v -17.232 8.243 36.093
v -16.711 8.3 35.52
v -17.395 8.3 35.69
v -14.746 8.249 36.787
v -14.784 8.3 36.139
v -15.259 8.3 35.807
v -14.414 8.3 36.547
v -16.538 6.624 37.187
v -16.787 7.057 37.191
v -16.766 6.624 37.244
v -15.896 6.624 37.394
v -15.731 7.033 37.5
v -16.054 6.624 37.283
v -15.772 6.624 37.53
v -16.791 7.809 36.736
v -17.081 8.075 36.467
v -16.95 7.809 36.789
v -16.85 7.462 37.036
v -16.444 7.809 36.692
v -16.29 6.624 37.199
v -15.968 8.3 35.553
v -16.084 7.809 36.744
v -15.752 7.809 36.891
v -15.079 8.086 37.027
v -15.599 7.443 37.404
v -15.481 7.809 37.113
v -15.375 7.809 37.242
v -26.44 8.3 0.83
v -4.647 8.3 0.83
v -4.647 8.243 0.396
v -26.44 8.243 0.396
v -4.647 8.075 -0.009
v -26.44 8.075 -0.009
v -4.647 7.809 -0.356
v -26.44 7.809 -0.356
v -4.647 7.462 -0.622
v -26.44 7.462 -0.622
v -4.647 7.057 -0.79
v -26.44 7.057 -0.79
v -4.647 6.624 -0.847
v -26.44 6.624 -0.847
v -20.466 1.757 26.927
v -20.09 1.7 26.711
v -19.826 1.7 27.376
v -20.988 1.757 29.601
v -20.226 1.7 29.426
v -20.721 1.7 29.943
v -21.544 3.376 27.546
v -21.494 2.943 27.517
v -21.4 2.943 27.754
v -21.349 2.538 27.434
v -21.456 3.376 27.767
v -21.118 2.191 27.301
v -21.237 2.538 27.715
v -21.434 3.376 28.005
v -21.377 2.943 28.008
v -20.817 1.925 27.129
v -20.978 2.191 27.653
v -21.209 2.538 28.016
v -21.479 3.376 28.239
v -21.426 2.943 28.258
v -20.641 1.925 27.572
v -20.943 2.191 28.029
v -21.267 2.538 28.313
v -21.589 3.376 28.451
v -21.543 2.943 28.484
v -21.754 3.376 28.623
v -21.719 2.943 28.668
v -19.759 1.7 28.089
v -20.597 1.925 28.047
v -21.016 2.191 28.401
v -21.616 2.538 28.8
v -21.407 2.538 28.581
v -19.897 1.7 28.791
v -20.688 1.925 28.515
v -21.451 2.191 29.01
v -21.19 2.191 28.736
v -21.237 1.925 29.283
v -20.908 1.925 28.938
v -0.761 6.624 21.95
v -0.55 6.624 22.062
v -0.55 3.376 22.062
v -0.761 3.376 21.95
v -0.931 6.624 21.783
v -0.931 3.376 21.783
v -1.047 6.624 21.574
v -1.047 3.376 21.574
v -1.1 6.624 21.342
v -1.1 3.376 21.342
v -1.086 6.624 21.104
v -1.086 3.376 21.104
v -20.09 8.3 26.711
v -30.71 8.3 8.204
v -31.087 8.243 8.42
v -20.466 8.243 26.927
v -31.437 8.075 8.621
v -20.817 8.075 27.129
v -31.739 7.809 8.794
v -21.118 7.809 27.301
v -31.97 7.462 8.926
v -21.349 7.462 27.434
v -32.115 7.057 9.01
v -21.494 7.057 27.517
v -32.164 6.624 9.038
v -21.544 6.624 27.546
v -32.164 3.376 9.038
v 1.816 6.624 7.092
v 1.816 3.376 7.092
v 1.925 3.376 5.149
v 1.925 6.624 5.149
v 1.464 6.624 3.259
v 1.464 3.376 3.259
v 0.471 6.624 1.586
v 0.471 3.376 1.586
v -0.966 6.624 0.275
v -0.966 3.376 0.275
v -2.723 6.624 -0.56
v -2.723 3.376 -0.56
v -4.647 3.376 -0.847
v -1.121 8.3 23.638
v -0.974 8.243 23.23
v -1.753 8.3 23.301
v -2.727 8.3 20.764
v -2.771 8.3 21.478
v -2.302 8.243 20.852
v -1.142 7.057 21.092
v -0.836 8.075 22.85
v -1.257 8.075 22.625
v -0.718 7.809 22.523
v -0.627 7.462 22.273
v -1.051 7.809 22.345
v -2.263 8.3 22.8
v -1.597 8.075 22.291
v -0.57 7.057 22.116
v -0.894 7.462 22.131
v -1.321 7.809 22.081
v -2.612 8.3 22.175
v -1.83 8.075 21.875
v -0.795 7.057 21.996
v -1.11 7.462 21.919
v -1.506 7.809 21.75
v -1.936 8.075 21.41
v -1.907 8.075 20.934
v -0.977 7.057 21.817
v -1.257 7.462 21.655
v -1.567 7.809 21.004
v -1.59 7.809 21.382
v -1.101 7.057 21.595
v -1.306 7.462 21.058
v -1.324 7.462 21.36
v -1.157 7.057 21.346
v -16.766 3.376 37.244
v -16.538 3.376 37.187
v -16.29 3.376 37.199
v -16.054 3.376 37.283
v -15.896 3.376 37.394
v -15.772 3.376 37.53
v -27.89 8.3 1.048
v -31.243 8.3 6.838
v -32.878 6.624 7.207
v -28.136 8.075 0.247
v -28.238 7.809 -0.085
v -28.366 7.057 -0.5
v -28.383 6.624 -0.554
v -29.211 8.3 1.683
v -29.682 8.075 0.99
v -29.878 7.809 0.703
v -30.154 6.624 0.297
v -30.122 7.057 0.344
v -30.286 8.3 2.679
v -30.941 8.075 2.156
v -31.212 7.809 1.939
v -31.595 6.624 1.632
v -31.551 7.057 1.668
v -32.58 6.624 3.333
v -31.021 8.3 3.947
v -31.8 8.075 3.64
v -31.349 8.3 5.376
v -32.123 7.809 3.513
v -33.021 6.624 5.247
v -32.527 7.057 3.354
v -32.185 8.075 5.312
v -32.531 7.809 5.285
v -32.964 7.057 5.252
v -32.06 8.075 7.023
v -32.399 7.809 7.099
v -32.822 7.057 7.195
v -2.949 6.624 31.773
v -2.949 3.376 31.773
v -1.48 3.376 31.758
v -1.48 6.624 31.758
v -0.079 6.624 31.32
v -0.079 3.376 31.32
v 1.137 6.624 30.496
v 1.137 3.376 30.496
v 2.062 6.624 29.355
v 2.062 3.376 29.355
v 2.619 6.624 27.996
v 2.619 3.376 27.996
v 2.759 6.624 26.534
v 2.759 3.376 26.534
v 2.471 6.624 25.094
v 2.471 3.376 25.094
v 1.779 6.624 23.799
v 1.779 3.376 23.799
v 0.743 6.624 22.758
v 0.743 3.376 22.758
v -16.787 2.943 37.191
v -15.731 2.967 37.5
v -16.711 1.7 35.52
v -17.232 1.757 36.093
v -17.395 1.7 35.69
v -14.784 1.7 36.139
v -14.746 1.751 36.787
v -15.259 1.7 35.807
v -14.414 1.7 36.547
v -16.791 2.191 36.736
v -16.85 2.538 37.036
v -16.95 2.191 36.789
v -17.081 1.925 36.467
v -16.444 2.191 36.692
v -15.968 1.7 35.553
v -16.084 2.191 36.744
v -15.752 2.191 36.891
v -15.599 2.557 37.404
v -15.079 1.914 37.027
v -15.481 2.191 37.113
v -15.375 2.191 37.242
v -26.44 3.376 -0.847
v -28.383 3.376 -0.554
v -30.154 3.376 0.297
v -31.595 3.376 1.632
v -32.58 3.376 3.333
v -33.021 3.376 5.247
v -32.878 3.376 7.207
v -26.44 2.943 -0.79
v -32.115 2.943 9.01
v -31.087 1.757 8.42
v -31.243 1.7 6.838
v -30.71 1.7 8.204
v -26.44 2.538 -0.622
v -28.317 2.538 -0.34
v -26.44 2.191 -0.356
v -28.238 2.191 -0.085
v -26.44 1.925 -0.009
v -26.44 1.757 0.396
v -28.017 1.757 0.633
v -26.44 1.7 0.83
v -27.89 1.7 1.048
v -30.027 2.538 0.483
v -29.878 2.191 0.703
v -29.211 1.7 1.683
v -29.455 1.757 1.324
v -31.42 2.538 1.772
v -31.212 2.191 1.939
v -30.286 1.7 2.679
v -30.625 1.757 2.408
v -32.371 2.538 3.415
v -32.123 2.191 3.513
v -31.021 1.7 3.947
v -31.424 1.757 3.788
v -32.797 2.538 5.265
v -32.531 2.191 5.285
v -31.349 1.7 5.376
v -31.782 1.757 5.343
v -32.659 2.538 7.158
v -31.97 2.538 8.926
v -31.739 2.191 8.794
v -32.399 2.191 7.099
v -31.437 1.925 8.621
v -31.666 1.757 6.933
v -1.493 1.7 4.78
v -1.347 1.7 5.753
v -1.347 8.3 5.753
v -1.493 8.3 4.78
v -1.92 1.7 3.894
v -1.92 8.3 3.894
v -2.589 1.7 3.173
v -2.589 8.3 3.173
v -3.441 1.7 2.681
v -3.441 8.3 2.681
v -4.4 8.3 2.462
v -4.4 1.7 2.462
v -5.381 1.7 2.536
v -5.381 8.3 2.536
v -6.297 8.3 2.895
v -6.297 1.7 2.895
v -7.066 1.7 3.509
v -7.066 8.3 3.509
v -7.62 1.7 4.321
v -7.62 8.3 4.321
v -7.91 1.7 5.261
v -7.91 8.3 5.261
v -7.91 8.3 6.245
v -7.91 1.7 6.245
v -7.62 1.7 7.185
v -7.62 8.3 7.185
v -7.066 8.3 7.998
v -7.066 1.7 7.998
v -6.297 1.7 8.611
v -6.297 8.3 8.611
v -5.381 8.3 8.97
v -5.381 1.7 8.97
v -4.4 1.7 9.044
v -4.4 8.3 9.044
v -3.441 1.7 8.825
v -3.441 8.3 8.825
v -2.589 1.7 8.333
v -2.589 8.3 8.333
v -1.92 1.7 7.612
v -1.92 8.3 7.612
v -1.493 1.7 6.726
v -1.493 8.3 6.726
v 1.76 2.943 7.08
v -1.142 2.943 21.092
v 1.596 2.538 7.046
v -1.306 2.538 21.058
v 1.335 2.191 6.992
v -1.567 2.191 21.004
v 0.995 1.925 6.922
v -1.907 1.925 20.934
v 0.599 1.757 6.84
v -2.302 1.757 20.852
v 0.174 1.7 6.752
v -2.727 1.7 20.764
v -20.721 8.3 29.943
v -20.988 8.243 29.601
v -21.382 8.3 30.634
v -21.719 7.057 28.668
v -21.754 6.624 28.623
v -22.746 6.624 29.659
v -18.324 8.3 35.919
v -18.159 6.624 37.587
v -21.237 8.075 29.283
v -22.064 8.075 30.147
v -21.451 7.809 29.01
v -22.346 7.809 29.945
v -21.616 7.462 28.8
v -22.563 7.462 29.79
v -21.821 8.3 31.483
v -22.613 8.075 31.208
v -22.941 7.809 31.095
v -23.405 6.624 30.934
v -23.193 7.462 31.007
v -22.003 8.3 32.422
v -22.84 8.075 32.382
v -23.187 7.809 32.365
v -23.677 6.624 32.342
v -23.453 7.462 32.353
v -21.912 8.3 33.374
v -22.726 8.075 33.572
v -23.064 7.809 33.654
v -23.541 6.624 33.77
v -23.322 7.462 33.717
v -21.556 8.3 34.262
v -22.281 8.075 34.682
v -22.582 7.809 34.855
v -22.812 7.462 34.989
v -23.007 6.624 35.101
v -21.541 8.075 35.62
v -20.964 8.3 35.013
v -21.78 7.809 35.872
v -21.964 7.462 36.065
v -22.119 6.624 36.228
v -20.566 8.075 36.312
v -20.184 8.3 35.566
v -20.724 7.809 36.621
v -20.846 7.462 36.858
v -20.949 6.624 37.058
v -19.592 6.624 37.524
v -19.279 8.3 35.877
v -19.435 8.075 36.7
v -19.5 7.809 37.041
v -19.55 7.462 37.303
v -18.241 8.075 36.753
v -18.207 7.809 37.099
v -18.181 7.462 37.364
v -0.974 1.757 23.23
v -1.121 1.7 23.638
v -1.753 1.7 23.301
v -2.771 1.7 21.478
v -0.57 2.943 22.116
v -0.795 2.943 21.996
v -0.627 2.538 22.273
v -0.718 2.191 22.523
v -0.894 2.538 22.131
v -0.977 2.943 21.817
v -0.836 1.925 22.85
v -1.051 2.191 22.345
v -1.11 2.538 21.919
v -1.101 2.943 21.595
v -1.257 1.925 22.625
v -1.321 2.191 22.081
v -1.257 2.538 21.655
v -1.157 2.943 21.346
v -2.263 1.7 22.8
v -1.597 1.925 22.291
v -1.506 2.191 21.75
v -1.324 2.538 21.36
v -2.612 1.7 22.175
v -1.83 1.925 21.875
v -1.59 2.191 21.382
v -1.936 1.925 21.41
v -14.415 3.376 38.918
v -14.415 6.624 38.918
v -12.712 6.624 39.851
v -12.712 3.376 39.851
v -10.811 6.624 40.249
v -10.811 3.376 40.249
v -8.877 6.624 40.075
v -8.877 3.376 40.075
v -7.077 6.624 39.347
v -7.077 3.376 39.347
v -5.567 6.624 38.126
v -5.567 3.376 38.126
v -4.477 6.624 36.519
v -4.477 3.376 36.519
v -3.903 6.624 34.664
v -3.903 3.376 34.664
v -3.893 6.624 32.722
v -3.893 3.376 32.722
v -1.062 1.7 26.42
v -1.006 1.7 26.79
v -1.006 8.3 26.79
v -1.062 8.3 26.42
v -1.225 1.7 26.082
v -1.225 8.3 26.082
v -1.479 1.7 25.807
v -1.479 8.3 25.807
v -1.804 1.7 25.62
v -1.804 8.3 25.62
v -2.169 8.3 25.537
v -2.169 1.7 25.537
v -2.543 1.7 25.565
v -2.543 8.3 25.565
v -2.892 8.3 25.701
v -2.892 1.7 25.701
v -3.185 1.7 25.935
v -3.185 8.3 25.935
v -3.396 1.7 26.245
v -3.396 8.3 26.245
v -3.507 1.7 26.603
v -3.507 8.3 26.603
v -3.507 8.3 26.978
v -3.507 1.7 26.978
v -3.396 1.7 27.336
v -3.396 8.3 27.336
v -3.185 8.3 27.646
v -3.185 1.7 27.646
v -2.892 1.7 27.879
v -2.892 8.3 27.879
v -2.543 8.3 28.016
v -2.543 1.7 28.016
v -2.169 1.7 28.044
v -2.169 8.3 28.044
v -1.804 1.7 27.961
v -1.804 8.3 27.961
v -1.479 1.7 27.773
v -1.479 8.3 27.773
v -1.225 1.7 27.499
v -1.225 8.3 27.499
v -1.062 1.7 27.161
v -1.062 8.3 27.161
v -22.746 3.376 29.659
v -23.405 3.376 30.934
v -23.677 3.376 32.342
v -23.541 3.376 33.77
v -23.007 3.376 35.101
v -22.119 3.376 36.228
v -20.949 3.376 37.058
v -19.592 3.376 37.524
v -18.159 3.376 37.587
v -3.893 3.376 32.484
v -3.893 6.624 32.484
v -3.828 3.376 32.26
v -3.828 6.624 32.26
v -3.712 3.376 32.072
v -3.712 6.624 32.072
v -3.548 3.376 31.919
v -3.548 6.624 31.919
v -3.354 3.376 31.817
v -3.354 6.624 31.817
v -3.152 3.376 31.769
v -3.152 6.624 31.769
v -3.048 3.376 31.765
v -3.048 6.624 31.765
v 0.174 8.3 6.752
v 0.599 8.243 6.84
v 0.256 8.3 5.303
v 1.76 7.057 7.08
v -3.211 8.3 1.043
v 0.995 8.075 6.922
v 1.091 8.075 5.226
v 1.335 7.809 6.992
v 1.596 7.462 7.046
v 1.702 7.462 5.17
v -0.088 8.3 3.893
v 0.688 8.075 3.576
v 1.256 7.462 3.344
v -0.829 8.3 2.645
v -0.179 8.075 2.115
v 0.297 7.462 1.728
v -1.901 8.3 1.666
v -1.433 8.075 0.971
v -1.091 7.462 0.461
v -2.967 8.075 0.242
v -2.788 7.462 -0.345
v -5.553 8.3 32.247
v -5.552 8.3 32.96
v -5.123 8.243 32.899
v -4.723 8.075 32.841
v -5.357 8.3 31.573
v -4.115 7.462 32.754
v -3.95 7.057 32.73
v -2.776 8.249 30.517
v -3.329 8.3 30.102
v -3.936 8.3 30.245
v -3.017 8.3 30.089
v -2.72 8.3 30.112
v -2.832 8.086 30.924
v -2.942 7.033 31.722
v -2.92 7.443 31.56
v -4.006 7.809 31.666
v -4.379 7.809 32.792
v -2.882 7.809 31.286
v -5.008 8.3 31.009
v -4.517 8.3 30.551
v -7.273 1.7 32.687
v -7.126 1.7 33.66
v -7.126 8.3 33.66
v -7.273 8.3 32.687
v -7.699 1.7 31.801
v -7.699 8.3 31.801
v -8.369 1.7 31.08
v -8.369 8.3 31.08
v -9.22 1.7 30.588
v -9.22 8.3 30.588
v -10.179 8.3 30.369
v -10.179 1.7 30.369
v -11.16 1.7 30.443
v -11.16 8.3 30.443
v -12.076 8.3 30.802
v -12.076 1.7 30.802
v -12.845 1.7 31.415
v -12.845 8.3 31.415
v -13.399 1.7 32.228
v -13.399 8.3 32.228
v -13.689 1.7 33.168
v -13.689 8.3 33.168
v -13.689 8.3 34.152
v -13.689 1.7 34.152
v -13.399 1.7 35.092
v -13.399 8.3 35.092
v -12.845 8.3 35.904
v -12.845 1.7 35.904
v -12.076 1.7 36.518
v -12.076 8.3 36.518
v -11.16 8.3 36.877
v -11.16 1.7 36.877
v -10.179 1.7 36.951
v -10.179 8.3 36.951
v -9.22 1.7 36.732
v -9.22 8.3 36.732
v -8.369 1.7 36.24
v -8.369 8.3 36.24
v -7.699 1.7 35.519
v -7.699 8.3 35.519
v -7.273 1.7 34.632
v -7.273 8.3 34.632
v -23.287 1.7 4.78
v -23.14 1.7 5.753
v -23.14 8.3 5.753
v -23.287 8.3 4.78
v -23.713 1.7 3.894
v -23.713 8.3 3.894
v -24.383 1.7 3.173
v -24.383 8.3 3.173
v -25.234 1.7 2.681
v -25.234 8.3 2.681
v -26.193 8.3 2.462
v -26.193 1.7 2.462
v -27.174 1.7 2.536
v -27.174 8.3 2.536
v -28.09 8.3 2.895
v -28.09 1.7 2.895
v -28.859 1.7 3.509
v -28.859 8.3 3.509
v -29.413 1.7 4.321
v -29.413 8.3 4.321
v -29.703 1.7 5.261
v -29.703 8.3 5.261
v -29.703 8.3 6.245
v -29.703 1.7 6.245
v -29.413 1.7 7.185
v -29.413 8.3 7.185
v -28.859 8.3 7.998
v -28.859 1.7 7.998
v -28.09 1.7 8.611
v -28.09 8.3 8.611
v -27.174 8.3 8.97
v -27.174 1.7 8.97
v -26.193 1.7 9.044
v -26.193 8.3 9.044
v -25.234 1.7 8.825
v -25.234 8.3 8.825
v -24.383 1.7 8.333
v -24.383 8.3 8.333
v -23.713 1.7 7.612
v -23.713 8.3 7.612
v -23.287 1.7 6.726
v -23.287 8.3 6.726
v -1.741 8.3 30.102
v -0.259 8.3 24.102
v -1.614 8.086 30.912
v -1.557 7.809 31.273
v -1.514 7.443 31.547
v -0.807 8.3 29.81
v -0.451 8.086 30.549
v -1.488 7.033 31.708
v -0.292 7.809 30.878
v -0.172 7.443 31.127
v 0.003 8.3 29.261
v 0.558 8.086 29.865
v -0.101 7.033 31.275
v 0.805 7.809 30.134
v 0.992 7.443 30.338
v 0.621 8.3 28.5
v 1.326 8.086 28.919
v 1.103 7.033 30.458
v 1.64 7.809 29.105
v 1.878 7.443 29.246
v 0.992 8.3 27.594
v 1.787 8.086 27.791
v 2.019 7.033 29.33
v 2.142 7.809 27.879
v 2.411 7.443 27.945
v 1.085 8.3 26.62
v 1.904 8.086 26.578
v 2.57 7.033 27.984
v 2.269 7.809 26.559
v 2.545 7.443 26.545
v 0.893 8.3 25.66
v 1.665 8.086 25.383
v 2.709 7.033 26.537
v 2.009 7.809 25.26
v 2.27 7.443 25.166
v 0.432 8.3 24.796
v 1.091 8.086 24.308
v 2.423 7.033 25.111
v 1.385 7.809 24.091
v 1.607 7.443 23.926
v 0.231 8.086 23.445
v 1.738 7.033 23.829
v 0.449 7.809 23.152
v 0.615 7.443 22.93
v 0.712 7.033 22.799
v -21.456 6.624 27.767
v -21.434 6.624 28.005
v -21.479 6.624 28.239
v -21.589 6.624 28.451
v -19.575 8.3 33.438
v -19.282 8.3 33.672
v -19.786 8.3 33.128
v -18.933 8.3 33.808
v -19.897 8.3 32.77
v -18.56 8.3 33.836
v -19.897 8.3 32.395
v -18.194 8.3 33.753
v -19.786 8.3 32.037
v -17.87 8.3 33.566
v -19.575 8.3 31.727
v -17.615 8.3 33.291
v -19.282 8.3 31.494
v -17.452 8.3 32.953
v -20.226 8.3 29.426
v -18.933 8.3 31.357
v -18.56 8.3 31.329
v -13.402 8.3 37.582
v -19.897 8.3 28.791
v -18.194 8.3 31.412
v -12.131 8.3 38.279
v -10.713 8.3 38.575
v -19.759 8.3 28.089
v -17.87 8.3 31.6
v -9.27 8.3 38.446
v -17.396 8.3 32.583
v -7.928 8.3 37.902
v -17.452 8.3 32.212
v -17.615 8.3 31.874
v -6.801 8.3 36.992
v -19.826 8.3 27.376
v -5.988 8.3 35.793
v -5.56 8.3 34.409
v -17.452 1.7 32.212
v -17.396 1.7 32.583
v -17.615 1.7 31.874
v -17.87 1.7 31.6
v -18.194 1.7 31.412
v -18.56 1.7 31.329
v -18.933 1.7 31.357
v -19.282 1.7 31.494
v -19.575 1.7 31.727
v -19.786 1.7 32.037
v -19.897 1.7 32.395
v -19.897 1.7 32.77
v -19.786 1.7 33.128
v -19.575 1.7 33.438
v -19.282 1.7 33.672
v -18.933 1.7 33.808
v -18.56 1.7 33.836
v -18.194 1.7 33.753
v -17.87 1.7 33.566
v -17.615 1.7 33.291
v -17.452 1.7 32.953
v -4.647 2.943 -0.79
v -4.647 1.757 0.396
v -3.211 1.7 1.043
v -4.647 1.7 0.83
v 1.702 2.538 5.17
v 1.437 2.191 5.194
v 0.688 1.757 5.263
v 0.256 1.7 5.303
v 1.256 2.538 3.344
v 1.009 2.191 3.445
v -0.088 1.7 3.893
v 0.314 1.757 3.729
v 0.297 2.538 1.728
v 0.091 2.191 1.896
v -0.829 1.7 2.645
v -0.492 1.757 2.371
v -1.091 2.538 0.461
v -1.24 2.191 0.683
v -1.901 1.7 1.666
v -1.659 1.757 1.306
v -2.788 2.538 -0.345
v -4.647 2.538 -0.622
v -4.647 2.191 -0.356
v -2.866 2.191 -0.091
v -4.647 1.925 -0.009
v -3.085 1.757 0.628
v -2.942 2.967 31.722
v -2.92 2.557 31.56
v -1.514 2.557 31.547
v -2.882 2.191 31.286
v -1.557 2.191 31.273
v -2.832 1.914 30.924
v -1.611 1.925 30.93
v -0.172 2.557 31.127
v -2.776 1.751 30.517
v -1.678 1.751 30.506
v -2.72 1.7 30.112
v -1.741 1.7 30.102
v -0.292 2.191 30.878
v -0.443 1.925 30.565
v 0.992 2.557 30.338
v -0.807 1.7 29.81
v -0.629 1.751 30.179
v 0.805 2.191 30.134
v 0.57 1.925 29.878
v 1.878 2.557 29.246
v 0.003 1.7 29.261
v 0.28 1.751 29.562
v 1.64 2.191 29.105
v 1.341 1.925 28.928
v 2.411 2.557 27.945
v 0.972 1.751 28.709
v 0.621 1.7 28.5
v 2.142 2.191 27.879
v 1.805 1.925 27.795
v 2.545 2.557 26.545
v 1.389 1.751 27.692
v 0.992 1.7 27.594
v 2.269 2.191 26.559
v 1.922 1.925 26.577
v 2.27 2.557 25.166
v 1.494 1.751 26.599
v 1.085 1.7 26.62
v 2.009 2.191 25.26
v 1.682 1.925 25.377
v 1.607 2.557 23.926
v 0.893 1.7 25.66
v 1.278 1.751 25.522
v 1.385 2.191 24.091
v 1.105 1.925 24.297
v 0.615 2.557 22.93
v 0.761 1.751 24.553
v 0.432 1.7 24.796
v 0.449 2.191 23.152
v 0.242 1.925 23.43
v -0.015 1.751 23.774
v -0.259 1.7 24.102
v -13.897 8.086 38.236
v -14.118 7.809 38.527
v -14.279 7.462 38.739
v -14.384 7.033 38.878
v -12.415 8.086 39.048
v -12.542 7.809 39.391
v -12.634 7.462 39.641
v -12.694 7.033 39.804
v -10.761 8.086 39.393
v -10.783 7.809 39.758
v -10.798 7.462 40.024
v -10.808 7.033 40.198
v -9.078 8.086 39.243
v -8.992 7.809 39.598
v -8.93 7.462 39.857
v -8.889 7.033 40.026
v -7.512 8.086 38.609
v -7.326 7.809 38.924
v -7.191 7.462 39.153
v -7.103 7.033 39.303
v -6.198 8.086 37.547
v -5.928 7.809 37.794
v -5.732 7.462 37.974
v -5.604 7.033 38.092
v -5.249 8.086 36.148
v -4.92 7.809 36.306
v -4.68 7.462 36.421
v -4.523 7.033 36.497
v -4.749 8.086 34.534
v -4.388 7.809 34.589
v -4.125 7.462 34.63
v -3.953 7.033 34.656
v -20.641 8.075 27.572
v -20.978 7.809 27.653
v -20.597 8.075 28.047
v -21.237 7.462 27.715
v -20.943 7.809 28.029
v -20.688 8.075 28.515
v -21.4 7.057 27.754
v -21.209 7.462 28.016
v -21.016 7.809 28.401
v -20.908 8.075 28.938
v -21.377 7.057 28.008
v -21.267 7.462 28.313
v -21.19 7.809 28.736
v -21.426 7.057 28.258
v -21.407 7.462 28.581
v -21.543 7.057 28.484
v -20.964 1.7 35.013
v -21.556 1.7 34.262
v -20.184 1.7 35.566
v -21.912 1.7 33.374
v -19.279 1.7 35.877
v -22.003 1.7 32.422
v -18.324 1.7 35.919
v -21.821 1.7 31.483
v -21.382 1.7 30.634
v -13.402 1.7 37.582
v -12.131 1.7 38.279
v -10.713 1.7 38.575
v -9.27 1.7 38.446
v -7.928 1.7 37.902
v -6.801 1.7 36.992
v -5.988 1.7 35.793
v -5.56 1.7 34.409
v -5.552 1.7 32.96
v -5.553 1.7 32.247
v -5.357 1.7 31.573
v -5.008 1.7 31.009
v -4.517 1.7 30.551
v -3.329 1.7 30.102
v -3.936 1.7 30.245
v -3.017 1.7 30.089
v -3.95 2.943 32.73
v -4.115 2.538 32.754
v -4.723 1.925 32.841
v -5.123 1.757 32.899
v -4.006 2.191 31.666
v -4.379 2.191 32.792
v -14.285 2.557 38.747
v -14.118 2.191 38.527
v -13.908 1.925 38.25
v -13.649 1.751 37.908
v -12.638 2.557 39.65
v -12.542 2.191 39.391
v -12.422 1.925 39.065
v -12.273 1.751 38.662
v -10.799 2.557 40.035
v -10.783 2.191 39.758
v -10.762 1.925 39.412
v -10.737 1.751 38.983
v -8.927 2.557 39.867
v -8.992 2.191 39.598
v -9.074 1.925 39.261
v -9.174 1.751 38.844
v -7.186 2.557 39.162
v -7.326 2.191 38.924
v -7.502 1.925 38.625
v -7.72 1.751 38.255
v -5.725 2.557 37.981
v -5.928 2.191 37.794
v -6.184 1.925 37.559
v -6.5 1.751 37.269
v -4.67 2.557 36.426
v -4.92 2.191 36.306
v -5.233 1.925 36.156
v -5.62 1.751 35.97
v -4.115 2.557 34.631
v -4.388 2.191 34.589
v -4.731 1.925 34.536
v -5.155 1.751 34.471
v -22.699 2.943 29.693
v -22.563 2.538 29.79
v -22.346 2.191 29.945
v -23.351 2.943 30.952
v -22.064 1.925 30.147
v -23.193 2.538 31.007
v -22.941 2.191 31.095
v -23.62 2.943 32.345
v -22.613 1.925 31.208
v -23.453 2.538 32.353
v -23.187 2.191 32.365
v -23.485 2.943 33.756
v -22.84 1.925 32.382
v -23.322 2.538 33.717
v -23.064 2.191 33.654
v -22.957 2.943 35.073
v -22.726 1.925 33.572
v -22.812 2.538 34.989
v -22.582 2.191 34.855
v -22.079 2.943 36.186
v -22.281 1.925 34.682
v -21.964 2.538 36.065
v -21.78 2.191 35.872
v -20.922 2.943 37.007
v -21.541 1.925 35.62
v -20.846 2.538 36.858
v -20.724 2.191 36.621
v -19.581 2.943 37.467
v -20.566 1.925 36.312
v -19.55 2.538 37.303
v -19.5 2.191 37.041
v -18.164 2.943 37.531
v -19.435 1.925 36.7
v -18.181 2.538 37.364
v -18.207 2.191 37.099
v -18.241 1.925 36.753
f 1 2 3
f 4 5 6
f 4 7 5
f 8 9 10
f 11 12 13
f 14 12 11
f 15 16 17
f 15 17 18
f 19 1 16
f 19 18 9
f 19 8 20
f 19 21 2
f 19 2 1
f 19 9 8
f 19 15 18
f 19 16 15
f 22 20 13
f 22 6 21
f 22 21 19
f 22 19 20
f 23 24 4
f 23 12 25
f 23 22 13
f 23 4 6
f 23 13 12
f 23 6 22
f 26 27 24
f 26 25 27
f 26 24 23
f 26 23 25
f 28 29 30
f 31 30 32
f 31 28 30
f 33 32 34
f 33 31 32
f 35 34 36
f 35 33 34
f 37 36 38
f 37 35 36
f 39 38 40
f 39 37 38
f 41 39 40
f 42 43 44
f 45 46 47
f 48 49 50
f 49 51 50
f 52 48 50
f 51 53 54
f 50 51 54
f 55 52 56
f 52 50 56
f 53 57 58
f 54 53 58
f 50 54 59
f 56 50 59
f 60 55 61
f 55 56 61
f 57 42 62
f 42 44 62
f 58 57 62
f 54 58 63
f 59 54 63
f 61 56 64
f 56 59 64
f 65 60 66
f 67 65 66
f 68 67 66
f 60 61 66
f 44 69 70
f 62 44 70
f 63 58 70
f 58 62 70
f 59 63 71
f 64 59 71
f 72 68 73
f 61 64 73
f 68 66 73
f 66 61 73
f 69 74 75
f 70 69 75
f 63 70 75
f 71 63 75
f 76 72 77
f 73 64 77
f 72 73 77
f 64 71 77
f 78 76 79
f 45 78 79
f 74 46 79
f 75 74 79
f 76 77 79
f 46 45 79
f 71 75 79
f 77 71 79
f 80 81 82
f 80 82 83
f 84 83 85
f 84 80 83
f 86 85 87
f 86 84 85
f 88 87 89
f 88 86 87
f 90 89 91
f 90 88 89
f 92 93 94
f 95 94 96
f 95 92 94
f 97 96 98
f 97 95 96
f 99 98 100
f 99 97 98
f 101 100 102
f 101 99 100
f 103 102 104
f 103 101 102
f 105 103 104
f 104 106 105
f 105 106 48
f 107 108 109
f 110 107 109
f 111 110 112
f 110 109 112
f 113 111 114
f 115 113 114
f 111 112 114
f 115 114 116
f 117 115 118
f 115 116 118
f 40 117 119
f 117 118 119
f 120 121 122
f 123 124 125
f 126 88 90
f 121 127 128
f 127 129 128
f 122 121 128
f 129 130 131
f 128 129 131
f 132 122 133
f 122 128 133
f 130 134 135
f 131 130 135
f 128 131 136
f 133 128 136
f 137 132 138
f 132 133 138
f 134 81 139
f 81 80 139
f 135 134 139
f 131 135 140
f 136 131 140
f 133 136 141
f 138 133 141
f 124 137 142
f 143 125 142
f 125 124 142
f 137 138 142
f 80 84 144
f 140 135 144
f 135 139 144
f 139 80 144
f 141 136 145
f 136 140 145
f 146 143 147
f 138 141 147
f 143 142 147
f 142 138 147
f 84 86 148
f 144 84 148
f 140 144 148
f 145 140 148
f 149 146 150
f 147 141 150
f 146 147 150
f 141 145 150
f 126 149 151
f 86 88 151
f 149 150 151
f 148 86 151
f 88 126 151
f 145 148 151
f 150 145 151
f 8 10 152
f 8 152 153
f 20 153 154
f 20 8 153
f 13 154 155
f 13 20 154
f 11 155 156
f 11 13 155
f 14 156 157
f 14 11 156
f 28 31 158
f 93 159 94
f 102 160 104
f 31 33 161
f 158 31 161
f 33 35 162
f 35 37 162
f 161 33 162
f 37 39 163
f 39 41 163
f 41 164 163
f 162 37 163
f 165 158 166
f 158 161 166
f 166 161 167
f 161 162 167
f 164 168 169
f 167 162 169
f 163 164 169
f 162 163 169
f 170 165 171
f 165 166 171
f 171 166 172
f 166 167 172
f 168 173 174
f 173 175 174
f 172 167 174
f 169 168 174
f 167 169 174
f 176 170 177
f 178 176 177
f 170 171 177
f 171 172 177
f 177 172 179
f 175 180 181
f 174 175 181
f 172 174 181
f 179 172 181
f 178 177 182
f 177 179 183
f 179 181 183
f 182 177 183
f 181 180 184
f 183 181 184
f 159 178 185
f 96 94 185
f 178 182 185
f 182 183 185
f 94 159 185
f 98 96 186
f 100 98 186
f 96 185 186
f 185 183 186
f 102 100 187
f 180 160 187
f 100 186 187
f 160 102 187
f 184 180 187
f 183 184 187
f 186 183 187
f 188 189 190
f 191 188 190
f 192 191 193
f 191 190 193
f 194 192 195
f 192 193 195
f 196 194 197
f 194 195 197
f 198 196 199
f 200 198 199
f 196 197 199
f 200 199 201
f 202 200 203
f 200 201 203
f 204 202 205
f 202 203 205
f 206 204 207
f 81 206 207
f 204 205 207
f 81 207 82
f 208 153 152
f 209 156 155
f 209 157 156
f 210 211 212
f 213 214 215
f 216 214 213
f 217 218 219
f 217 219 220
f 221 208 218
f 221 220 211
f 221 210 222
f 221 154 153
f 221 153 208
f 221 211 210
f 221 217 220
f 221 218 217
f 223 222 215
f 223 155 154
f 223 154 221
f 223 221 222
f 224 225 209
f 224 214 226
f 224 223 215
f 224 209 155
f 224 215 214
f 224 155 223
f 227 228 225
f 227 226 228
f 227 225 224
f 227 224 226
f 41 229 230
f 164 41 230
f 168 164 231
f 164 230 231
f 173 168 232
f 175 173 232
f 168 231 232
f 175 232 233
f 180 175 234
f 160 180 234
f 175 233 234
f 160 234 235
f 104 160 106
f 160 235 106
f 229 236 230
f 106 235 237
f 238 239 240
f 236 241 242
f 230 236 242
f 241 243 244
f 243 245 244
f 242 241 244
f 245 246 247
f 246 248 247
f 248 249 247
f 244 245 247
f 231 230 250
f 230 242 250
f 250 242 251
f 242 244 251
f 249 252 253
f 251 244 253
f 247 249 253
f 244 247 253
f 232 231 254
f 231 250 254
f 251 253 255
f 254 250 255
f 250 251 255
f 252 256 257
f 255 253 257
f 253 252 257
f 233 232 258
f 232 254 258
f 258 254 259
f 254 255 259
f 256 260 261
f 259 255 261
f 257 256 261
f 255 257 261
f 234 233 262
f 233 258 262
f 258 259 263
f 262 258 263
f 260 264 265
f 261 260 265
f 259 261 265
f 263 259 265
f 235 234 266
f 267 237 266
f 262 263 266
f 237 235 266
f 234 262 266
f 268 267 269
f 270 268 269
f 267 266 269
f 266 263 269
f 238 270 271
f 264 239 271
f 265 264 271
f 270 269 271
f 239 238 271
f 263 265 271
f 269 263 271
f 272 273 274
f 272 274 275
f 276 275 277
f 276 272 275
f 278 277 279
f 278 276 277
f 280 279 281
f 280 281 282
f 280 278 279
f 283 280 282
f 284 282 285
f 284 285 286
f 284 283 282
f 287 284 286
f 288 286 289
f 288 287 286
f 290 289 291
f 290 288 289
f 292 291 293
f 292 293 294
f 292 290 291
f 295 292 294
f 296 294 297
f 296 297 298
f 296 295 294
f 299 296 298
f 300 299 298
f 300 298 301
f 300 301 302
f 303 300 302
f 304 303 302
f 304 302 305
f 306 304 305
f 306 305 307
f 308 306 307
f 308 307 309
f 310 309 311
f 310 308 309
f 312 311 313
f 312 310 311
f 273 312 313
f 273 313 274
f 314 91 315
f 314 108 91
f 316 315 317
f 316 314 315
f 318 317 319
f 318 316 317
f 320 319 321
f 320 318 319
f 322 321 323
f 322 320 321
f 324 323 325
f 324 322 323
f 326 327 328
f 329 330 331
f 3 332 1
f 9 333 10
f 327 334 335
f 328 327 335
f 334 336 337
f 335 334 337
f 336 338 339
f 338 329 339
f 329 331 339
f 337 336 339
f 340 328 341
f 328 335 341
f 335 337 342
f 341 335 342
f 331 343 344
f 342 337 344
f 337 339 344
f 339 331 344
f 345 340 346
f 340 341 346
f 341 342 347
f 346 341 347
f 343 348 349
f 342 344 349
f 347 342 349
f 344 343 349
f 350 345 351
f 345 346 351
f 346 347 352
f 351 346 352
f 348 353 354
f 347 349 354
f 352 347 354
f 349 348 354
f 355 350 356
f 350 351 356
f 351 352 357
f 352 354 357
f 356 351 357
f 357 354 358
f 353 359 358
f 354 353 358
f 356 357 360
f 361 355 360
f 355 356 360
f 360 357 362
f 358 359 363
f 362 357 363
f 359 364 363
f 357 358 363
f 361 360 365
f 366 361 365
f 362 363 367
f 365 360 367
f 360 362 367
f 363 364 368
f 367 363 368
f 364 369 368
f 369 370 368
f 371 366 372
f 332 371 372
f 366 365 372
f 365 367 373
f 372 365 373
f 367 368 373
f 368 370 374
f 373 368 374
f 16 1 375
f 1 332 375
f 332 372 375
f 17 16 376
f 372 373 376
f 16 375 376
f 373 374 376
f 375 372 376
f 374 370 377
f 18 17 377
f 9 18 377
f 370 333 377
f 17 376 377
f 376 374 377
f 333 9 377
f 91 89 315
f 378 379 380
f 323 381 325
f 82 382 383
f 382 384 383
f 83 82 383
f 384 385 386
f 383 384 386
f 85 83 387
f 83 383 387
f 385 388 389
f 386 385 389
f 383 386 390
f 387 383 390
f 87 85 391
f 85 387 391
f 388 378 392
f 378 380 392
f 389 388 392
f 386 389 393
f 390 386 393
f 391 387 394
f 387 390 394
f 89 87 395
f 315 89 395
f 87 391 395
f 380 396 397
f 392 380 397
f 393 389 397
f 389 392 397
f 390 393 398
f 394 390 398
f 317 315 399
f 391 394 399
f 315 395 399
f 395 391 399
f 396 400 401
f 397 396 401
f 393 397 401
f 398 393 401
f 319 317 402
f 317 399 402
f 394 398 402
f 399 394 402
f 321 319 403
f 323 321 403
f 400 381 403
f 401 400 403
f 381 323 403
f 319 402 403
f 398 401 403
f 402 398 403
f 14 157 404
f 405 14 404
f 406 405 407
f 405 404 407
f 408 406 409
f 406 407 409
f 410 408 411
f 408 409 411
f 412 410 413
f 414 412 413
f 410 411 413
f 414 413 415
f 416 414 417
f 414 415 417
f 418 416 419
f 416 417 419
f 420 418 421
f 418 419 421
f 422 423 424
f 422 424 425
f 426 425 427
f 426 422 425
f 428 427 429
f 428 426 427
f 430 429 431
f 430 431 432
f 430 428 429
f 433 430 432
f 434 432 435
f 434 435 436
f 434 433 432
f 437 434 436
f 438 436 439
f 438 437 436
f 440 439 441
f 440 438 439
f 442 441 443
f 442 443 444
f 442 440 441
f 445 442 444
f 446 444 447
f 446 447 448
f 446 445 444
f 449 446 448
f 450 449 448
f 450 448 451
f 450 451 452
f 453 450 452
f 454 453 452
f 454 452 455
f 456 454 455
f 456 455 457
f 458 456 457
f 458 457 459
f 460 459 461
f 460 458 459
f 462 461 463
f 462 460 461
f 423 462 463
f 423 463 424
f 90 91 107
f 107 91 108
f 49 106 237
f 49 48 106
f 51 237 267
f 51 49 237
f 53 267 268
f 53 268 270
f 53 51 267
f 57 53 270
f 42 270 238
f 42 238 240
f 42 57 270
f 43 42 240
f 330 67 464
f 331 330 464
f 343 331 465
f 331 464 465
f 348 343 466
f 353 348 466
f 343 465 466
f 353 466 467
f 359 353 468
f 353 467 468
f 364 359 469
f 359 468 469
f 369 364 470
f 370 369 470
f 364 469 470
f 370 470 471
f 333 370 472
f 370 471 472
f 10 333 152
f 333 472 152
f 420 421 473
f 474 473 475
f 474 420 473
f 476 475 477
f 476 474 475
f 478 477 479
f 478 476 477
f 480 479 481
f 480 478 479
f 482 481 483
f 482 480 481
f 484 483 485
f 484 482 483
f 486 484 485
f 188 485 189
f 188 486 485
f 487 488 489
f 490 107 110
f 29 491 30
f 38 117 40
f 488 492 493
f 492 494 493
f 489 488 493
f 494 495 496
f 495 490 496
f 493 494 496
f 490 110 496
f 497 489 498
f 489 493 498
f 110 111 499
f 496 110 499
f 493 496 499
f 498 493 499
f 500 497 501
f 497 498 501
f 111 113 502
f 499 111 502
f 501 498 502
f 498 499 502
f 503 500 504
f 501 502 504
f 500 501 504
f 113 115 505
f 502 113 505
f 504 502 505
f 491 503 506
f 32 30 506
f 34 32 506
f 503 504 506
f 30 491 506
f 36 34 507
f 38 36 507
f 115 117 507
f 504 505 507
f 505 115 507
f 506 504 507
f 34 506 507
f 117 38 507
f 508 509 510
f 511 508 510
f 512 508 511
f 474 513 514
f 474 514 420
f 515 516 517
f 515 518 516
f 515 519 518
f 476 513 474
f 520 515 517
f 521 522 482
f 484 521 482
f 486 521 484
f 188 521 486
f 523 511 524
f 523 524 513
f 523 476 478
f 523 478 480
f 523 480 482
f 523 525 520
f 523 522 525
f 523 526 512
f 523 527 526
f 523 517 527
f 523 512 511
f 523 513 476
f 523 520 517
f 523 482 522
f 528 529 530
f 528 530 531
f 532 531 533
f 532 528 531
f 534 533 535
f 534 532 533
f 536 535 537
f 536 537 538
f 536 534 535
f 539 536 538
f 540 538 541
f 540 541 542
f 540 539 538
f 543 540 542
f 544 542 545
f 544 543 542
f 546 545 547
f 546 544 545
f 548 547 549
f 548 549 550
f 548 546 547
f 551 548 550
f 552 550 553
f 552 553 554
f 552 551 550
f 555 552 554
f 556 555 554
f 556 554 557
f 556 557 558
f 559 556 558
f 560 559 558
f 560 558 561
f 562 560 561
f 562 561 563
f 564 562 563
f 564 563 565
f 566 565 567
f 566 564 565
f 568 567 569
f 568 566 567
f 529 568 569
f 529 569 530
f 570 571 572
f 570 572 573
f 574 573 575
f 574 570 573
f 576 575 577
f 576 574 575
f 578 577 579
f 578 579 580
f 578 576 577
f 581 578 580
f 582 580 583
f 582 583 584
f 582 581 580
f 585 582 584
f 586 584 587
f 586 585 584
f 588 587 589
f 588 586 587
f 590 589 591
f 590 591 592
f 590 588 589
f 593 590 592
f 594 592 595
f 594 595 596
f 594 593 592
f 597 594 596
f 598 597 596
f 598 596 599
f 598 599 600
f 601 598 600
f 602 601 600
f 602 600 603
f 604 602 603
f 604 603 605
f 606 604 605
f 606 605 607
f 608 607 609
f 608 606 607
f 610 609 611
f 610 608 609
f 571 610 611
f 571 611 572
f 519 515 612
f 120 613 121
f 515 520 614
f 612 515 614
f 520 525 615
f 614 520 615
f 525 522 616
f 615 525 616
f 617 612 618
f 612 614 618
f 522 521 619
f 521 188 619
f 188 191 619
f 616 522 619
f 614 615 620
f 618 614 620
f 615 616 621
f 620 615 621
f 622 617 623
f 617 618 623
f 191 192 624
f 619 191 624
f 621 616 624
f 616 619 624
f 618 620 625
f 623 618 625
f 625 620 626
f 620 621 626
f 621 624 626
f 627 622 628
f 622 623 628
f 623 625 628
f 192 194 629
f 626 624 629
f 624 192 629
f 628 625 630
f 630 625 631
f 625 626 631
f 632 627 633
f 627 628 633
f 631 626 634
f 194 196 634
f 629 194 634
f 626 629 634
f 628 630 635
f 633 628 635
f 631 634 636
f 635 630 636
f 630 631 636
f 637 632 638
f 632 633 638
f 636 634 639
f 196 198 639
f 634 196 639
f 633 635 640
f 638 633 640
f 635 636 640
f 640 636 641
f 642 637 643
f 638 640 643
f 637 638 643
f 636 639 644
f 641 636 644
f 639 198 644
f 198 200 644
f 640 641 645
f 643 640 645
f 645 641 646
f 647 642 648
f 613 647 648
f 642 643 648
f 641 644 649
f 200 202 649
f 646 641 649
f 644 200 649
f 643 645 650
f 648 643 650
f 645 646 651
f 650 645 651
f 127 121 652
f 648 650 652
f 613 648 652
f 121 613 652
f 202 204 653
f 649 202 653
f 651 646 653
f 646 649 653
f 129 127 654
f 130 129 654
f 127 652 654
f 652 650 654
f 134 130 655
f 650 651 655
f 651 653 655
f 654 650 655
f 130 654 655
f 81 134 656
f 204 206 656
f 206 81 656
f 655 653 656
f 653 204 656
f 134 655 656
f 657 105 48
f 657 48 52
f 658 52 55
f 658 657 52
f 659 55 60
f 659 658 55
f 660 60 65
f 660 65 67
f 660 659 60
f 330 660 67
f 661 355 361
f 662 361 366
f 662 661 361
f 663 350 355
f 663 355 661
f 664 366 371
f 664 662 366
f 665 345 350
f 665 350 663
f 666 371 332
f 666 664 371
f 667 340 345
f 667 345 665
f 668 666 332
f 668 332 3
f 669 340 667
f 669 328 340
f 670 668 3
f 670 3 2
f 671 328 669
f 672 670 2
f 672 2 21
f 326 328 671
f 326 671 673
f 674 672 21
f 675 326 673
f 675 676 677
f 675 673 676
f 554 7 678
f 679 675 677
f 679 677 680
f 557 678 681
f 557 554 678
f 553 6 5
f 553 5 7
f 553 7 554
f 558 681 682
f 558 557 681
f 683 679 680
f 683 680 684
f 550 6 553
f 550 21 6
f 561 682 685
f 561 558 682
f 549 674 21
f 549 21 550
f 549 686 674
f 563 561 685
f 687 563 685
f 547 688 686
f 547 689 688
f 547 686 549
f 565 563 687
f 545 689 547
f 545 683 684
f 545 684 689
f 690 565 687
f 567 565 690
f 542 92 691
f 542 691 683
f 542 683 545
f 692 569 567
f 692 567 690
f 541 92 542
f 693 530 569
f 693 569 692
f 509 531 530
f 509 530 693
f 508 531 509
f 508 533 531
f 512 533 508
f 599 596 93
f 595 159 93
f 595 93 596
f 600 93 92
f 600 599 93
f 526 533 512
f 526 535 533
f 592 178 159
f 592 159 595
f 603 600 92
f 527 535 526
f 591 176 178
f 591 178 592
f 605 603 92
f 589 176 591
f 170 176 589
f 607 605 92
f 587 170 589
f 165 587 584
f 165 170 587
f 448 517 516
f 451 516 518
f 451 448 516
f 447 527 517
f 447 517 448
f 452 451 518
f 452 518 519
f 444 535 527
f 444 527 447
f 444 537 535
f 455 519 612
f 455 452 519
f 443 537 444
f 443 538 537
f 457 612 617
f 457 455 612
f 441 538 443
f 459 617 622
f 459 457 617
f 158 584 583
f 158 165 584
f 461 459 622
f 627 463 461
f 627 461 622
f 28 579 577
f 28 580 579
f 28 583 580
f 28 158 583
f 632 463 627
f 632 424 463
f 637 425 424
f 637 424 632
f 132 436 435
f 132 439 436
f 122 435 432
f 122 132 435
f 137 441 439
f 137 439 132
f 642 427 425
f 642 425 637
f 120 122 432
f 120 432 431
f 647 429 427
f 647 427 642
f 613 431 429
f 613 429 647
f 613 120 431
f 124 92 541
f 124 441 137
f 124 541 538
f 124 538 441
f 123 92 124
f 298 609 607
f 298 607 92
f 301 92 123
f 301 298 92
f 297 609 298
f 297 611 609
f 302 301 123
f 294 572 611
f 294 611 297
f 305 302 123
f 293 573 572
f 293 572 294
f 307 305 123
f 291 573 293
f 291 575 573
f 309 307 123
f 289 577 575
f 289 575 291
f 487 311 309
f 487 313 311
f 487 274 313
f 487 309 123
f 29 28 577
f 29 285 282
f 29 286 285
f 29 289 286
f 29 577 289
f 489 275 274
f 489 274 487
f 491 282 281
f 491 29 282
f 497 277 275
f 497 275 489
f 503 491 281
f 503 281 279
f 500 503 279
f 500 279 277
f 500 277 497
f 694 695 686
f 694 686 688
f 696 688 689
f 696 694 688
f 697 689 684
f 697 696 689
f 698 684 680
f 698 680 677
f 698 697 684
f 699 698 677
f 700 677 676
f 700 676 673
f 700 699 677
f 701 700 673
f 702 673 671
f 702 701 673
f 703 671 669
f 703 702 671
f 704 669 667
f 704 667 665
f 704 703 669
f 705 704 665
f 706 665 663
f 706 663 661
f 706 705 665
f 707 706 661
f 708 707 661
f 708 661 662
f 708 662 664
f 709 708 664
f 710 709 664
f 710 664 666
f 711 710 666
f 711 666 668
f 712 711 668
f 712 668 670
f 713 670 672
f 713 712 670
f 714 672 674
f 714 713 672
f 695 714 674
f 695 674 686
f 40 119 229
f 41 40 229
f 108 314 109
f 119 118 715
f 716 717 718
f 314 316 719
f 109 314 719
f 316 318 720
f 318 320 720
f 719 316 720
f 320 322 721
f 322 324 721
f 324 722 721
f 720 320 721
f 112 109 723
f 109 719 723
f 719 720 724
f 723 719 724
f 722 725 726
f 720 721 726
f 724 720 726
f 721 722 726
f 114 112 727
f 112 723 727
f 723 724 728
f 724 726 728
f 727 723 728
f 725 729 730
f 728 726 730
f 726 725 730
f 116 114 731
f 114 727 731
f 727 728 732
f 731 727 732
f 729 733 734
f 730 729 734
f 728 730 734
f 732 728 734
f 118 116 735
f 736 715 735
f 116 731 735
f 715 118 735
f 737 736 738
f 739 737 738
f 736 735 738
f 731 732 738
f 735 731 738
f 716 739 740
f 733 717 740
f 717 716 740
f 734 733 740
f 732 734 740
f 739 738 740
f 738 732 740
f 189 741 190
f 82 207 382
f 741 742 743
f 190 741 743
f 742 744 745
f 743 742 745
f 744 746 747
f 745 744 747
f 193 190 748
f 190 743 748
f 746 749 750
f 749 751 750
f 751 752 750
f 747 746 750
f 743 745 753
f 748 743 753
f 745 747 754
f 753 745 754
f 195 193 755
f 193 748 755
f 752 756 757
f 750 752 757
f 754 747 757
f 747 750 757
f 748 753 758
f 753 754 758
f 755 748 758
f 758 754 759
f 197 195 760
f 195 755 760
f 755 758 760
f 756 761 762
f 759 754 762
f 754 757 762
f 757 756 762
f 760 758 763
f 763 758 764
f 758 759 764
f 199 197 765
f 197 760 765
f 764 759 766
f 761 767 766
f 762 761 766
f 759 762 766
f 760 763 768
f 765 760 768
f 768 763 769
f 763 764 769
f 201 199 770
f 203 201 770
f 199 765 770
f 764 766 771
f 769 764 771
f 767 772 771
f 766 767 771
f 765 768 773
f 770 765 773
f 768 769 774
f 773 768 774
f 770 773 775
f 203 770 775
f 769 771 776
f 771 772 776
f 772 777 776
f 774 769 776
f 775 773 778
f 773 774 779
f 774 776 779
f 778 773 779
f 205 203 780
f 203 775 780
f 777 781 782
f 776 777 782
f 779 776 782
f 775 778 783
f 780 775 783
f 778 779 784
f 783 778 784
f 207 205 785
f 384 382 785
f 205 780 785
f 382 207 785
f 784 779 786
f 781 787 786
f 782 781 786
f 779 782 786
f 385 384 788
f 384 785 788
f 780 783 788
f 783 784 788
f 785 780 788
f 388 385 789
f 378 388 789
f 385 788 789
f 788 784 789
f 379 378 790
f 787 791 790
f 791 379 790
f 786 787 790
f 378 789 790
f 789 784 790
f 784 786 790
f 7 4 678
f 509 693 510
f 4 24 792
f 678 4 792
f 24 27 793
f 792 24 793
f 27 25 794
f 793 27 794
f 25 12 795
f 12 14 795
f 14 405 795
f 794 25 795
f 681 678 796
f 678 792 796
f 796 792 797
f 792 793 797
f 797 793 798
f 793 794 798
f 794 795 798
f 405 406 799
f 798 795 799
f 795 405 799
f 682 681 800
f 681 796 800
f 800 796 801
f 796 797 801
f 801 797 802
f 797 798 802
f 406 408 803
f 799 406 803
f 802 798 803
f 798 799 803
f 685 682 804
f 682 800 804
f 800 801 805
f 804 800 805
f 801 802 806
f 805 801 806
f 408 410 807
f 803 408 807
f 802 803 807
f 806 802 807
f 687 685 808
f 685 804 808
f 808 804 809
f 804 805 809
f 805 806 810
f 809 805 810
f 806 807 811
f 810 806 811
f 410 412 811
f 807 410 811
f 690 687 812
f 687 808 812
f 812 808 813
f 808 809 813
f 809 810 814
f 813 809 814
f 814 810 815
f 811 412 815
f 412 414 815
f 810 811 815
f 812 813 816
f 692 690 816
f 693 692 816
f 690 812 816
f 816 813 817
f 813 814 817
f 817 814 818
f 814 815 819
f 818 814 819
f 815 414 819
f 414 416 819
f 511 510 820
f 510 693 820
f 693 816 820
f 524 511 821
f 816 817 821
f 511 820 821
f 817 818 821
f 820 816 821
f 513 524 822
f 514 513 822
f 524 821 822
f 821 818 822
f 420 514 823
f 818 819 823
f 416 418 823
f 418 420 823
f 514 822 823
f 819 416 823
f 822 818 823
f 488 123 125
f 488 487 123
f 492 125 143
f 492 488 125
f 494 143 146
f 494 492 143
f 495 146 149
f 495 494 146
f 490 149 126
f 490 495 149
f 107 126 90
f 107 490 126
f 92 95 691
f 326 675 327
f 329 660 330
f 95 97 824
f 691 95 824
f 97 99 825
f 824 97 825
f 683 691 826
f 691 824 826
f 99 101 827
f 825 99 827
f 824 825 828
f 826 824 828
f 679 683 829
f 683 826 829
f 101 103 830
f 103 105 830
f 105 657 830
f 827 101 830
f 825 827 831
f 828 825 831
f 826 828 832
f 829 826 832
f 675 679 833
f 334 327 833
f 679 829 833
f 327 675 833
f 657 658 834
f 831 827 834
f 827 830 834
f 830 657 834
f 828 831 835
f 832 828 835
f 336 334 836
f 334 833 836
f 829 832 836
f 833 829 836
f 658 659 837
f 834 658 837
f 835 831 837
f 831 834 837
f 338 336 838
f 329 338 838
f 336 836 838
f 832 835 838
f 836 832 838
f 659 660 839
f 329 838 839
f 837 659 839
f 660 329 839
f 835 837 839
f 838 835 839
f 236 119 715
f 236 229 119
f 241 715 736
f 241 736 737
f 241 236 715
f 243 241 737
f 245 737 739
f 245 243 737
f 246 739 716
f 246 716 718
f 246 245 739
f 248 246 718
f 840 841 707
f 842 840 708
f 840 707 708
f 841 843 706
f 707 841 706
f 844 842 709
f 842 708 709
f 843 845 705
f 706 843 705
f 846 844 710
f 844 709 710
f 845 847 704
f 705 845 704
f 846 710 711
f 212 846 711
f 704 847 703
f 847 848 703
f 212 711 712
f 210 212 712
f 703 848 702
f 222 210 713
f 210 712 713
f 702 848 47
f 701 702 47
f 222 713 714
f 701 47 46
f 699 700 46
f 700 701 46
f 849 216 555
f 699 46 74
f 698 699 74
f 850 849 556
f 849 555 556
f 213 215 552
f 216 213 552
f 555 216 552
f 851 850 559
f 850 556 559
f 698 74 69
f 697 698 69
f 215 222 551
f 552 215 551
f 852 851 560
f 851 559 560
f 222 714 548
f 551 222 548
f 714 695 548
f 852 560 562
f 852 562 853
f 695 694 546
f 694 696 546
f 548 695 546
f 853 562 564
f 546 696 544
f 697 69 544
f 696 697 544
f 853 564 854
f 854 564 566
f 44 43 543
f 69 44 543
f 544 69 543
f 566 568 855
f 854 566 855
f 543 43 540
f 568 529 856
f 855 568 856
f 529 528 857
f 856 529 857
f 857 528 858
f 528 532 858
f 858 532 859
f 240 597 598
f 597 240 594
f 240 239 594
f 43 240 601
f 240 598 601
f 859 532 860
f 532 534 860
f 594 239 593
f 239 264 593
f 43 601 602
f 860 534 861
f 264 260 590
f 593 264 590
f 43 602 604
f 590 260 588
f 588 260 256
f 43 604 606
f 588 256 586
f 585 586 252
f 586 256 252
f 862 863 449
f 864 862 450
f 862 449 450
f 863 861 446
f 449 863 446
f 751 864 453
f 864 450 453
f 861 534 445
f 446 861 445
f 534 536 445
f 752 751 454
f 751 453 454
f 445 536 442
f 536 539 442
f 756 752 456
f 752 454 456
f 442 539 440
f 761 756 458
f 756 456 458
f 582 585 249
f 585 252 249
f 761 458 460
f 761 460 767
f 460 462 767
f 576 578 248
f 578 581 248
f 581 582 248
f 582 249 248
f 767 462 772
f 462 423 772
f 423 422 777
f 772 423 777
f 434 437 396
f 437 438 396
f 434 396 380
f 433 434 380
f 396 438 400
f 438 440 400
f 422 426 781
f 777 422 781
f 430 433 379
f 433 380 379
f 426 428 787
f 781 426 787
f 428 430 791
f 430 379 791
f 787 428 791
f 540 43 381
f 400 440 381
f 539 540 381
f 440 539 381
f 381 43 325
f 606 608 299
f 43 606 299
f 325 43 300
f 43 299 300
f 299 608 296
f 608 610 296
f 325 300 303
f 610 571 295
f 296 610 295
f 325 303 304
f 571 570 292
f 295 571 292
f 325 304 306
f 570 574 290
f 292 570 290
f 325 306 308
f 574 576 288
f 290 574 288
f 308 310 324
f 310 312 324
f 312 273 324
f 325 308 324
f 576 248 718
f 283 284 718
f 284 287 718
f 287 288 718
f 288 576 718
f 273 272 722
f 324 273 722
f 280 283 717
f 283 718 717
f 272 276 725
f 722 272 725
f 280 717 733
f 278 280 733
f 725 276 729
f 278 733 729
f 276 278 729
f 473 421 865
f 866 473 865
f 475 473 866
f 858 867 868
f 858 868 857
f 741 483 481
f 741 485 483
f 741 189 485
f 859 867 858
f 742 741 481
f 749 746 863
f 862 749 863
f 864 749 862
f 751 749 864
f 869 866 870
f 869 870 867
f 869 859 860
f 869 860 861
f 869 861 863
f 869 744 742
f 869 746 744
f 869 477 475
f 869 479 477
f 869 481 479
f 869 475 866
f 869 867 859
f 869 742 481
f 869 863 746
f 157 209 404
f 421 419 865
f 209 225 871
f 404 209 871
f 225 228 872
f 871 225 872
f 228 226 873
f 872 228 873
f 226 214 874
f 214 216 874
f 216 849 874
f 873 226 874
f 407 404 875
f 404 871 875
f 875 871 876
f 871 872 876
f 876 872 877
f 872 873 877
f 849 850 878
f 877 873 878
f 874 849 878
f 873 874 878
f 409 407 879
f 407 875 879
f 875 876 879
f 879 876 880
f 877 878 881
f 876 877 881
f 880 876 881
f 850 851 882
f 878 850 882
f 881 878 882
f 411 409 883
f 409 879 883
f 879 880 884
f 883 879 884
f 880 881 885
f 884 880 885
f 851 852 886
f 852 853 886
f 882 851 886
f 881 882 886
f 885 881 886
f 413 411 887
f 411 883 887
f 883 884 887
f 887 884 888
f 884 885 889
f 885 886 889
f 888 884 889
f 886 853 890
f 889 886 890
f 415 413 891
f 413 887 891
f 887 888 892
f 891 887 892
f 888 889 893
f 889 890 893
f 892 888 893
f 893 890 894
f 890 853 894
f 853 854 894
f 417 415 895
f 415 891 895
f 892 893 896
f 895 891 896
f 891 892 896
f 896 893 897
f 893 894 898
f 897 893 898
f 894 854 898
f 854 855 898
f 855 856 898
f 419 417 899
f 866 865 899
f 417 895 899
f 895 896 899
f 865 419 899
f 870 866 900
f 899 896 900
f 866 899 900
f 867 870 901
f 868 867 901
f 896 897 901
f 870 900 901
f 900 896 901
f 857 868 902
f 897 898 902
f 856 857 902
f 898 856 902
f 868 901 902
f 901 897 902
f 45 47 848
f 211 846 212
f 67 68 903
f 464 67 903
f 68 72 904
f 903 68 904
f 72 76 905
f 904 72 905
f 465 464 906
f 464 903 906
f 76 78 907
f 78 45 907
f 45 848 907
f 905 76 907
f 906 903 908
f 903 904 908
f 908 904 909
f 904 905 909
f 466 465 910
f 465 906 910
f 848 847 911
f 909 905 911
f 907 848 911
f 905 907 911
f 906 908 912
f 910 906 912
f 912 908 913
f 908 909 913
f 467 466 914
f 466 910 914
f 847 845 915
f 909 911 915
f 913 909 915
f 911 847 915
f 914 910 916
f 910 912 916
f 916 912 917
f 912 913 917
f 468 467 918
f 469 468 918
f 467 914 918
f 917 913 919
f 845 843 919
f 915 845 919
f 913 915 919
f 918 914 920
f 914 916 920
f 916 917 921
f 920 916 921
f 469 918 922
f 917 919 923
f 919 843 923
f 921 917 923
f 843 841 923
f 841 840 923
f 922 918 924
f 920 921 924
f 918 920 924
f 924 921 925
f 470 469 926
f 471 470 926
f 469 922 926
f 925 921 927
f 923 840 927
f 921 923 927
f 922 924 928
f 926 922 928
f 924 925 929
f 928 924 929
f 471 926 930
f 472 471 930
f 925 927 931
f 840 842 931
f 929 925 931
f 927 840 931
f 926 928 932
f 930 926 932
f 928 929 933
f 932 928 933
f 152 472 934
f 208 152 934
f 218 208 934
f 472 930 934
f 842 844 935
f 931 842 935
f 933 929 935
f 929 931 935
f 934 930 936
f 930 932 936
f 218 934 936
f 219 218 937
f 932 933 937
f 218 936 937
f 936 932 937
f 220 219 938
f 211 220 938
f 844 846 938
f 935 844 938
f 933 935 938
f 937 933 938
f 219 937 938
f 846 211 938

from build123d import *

# Parameters (mm, degrees)
SKETCH1_R           = 5
SKETCH1_R_2         = 1.905
BOSS_EXTRUDE1_DEPTH = 10
FILLET2_R           = 1.27
FILLET1_R           = 2.54
SCALE1_SCALE        = 0.66


with BuildPart() as part:
    # Sketch1 → Boss-Extrude1 (new body)
    with BuildSketch(Plane(origin=(0, 0, 0), x_dir=(1, 0, 0), z_dir=(0, 1, 0))):
        with BuildLine():
            Line((-41.693402896, -4.977156036), (-25.014953019, -34.04172914))
            ThreePointArc((-25.014953019, -34.04172914), (-27.831493127, -44.443455046), (-17.42976722, -47.259995153))
            ThreePointArc((-17.42976722, -47.259995153), (-4.558655696, -51.359140251), (0.652959758, -38.896894596))
            ThreePointArc((0.652959758, -38.896894596), (10.887641345, -34.13704865), (5.156505389, -24.412907491))
            Line((5.156505389, -24.412907491), (9.792227679, -2.027875017))
            ThreePointArc((9.792227679, -2.027875017), (7.754958097, 6.313527137), (0, 10))
            Line((0, 10), (-33.02, 10))
            ThreePointArc((-33.02, 10), (-41.673657041, 5.011408966), (-41.693402896, -4.977156036))
        make_face()
        with Locations((-33.02, 0)):
            Circle(SKETCH1_R, mode=Mode.SUBTRACT)
        Circle(SKETCH1_R, mode=Mode.SUBTRACT)
        with Locations((-8.756364325, -42.282839117)):
            Circle(SKETCH1_R, mode=Mode.SUBTRACT)
        with Locations((-21.22236012, -40.650862147)):
            Circle(SKETCH1_R_2, mode=Mode.SUBTRACT)
        with Locations((3.611264626, -31.874584982)):
            Circle(SKETCH1_R_2, mode=Mode.SUBTRACT)
    extrude(amount=BOSS_EXTRUDE1_DEPTH)

    # Fillet2
    fillet2_edges = [part.edges().sort_by_distance(p)[0] for p in [
        (5.156505389, 5, 24.412907491),
        (0.652959758, 5, 38.896894596),
        (-17.42976722, 5, 47.259995153),
        (-25.014953019, 5, 34.04172914),
    ]]
    fillet(fillet2_edges, radius=FILLET2_R)

    # Fillet1
    fillet1_edges = [part.edges().sort_by_distance(p)[0] for p in [
        (-33.647536039, 0, 18.998224371),
        (-41.673657041, 0, -5.011408966),
        (7.754958097, 10, -6.313527137),
        (-16.51, 10, -10),
        (-41.673657041, 10, -5.011408966),
        (7.593891323, 0, 12.643228492),
        (7.593891323, 10, 12.643228492),
        (11.008943171, 0, 33.70181024),
        (11.008943171, 10, 33.70181024),
        (-5.004925911, 0, 51.552505229),
        (-5.004925911, 10, 51.552505229),
        (-27.817933745, 0, 44.466986955),
        (-27.817933745, 10, 44.466986955),
        (5.530485293, 0, 24.135575816),
        (5.530485293, 10, 24.135575816),
        (1.498671614, 0, 39.786171251),
        (1.498671614, 10, 39.786171251),
        (-17.535076824, 0, 47.670329533),
        (-17.535076824, 10, 47.670329533),
        (-25.456713049, 0, 33.89468526),
        (-25.456713049, 10, 33.89468526),
        (-33.647536039, 10, 18.998224371),
        (-16.51, 0, -10),
        (7.754958097, 0, -6.313527137),
    ]]
    fillet(fillet1_edges, radius=FILLET1_R)


with BuildPart() as part_1:
    # Scale1: scaled about (-13.667161436, 5, 16.92089014)
    add(part.part.scale(SCALE1_SCALE).moved(Location((-4.646834888, 1.7, 5.753102648))))


solid = part_1.part
